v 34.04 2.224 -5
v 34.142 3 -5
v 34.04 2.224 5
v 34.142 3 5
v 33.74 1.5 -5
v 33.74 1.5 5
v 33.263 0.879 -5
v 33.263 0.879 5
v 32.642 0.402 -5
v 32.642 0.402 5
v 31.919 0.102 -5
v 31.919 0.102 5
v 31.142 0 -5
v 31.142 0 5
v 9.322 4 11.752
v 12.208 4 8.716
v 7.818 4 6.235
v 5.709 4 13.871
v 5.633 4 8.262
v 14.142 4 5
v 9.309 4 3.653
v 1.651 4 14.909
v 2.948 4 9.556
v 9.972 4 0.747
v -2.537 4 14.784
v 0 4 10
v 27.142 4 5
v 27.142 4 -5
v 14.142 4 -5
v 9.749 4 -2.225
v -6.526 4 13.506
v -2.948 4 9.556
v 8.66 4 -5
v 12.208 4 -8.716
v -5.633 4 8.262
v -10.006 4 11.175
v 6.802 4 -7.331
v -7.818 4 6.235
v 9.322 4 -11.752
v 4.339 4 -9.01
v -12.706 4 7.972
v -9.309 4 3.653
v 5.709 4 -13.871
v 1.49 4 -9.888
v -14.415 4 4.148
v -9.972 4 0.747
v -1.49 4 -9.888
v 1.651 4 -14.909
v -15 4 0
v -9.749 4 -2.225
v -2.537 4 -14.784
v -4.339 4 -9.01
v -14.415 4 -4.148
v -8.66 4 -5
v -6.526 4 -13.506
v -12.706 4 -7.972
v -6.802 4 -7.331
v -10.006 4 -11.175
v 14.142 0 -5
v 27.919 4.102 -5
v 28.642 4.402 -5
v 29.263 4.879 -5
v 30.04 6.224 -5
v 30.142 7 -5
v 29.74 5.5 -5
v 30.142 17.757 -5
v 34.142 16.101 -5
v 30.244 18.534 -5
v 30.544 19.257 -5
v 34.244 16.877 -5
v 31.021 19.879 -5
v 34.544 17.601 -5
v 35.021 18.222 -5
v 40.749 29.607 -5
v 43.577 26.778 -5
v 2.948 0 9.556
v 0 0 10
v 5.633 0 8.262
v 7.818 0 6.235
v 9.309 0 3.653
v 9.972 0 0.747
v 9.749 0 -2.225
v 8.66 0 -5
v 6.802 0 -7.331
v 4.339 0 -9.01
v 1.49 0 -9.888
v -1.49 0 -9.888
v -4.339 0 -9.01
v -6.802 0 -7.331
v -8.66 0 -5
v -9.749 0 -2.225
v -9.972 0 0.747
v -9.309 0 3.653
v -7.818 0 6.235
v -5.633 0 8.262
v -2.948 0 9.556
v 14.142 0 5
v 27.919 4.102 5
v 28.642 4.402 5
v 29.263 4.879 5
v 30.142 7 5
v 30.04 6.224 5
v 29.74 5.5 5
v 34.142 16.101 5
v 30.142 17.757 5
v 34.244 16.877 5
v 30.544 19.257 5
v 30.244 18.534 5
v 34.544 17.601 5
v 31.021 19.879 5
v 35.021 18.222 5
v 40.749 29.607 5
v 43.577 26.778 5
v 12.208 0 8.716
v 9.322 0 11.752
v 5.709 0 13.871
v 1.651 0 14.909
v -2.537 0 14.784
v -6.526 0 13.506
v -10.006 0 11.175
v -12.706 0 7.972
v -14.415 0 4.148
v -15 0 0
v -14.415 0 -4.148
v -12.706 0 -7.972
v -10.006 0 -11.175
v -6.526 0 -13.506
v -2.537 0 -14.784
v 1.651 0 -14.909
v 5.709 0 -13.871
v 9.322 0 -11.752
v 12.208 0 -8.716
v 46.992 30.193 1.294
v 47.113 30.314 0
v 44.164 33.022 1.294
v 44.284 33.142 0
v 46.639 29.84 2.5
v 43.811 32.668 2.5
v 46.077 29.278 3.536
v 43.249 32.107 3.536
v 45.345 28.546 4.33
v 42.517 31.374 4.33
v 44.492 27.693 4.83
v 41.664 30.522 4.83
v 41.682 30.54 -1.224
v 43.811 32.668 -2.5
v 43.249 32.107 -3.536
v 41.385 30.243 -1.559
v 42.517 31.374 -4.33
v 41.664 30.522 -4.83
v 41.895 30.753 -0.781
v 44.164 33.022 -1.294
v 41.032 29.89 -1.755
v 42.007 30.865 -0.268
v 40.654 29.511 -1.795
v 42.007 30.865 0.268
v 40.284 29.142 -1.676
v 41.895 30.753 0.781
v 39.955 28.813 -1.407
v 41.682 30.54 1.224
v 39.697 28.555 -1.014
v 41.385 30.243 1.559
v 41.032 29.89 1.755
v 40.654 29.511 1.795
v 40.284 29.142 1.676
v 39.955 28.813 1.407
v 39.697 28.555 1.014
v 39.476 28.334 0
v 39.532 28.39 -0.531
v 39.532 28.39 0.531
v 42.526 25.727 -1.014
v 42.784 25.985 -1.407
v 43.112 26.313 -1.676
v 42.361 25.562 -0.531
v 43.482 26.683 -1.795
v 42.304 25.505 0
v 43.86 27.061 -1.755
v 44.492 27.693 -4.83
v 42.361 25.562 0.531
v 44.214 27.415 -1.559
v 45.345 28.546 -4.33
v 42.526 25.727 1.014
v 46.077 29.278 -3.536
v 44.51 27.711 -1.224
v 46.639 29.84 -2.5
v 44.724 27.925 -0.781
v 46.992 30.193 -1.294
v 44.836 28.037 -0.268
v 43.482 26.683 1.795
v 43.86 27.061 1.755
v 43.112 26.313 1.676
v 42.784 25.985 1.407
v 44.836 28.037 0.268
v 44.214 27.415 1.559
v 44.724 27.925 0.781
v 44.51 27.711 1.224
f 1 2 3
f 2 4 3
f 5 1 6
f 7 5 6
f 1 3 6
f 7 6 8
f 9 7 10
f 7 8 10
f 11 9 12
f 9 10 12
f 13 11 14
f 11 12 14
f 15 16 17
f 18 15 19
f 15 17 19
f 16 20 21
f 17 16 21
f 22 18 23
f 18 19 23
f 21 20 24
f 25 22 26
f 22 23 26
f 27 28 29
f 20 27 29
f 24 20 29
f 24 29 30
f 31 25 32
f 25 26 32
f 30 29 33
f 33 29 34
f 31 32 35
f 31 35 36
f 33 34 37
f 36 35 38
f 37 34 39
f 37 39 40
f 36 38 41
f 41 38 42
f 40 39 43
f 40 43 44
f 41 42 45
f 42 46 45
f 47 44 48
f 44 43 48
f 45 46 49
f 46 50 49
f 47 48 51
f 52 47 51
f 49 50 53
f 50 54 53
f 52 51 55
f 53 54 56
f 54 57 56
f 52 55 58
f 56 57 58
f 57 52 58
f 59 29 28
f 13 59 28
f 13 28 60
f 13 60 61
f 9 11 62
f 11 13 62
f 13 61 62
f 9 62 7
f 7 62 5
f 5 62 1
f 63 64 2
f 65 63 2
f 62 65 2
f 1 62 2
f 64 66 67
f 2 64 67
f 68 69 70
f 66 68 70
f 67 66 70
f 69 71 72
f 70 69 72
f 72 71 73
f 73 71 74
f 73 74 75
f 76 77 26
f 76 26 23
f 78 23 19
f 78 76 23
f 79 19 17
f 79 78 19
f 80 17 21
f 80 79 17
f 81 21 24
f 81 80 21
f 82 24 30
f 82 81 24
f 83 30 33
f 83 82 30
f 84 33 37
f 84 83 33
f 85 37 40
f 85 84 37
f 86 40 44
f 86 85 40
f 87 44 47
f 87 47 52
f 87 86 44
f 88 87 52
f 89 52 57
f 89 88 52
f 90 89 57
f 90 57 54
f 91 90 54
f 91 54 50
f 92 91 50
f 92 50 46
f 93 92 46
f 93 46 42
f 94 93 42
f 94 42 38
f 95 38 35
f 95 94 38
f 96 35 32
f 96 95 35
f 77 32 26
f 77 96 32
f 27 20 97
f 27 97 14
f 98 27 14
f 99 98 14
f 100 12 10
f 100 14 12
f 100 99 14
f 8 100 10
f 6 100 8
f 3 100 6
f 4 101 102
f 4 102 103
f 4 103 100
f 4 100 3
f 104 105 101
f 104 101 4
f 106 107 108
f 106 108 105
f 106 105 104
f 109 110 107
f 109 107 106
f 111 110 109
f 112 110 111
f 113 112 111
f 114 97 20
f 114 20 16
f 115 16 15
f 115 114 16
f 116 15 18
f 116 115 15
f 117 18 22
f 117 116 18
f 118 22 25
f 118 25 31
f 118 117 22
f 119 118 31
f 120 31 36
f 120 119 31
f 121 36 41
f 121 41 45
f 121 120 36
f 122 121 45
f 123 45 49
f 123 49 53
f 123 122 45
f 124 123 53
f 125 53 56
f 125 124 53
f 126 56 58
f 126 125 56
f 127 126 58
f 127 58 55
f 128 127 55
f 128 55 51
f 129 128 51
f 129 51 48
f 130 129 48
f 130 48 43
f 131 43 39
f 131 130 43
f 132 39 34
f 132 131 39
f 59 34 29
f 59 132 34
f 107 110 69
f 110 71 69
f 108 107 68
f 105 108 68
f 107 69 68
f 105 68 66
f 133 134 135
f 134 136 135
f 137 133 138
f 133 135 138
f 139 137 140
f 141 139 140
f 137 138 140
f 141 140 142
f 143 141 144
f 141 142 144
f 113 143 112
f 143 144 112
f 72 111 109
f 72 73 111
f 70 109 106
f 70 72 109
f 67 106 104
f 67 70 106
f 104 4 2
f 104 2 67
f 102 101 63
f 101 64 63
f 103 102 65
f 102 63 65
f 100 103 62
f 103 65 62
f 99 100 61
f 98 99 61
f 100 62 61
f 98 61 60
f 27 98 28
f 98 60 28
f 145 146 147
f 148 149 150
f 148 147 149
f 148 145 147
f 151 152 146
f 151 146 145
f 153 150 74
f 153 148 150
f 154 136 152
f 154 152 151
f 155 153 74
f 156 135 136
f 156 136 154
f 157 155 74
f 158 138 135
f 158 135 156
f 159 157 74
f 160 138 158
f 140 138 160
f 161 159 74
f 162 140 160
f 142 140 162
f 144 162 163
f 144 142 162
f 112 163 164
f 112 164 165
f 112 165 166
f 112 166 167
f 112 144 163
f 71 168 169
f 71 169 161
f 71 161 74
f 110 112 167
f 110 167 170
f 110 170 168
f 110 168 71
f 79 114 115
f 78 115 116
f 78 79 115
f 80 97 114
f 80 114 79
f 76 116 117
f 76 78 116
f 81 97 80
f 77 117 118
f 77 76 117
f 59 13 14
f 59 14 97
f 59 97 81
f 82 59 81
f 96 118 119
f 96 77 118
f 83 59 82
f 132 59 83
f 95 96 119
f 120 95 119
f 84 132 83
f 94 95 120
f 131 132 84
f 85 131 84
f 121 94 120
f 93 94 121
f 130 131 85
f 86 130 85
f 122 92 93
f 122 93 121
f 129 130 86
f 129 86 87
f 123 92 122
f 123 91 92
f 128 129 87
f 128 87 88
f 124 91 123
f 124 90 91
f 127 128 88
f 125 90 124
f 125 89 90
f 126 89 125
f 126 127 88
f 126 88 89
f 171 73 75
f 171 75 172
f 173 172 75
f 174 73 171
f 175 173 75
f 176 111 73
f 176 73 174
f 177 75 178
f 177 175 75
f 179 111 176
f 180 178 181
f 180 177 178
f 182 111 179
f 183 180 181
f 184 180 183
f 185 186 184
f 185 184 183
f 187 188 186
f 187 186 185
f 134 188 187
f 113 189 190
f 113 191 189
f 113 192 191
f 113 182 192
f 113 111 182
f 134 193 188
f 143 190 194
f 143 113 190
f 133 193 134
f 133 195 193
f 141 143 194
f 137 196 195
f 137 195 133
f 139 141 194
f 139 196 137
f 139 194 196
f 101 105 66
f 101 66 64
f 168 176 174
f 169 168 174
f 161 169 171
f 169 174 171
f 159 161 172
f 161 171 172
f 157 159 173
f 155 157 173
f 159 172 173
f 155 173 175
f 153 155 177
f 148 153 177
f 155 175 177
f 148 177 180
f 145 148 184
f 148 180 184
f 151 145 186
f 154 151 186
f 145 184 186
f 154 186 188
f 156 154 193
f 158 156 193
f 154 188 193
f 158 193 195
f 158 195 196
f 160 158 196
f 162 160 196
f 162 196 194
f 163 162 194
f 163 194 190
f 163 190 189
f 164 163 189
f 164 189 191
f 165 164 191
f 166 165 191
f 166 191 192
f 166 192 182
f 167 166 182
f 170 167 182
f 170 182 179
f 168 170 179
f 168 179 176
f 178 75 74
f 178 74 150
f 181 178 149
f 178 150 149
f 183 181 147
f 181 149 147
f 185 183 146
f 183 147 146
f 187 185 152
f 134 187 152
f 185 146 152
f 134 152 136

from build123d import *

# Parameters (mm, degrees)
SKETCH2_R            = 10
BOSS_EXTRUDE1_DEPTH  = 4
BOSS_EXTRUDE2_DEPTH  = 10
FILLET1_R            = 5
M3_CLEARANCE_HOLE1_D = 3.6
FILLET2_R            = 3


with BuildPart() as part:
    # Sketch2 → Boss-Extrude1 (new body)
    with BuildSketch(Plane(origin=(0, 0, 0), x_dir=(1, 0, 0), z_dir=(0, 1, 0))):
        with BuildLine():
            Line((34.142135624, 5), (34.142135624, -5))
            Line((34.142135624, -5), (14.142135624, -5))
            ThreePointArc((14.142135624, -5), (-15, 0), (14.142135624, 5))
            Line((14.142135624, 5), (34.142135624, 5))
        make_face()
        with Locations(Location((0, 0, 0), (0, 0, 270))):
            Circle(SKETCH2_R, mode=Mode.SUBTRACT)
    extrude(amount=BOSS_EXTRUDE1_DEPTH)

    # Sketch3 → Boss-Extrude2 (add)
    with BuildSketch(Plane.XY.offset(5)):
        Polygon((34.142135624, 4), (34.142135624, 17.343145751), (47.112698372, 30.313708499), (44.284271247, 33.142135624), (30.142135624, 19), (30.142135624, 4), align=None)
    extrude(amount=-BOSS_EXTRUDE2_DEPTH)

    # Fillet1
    fillet1_edges = [part.edges().sort_by_distance(p)[0] for p in [
        (45.69848481, 31.727922061, 5),
        (45.69848481, 31.727922061, -5),
    ]]
    fillet(fillet1_edges, radius=FILLET1_R - 0.0001)  # a hair under: the kernel refuses the full size

    # M3 Clearance Hole1 (through all)
    with Locations(Plane(origin=(5.571067812, -5.571067812, 0), x_dir=(0.7071067811865489, 0.7071067811865462, 0), z_dir=(-0.7071067811865462, 0.7071067811865489, 0))):
        with Locations((49.748737342, 0)):
            Hole(M3_CLEARANCE_HOLE1_D / 2)

    # Fillet2
    fillet2_edges = [part.edges().sort_by_distance(p)[0] for p in [
        (30.142135624, 4, 0),
        (30.142135624, 19, 0),
        (34.142135624, 17.343145751, 0),
        (34.142135624, 0, 0),
    ]]
    fillet(fillet2_edges, radius=FILLET2_R)


solid = part.part
